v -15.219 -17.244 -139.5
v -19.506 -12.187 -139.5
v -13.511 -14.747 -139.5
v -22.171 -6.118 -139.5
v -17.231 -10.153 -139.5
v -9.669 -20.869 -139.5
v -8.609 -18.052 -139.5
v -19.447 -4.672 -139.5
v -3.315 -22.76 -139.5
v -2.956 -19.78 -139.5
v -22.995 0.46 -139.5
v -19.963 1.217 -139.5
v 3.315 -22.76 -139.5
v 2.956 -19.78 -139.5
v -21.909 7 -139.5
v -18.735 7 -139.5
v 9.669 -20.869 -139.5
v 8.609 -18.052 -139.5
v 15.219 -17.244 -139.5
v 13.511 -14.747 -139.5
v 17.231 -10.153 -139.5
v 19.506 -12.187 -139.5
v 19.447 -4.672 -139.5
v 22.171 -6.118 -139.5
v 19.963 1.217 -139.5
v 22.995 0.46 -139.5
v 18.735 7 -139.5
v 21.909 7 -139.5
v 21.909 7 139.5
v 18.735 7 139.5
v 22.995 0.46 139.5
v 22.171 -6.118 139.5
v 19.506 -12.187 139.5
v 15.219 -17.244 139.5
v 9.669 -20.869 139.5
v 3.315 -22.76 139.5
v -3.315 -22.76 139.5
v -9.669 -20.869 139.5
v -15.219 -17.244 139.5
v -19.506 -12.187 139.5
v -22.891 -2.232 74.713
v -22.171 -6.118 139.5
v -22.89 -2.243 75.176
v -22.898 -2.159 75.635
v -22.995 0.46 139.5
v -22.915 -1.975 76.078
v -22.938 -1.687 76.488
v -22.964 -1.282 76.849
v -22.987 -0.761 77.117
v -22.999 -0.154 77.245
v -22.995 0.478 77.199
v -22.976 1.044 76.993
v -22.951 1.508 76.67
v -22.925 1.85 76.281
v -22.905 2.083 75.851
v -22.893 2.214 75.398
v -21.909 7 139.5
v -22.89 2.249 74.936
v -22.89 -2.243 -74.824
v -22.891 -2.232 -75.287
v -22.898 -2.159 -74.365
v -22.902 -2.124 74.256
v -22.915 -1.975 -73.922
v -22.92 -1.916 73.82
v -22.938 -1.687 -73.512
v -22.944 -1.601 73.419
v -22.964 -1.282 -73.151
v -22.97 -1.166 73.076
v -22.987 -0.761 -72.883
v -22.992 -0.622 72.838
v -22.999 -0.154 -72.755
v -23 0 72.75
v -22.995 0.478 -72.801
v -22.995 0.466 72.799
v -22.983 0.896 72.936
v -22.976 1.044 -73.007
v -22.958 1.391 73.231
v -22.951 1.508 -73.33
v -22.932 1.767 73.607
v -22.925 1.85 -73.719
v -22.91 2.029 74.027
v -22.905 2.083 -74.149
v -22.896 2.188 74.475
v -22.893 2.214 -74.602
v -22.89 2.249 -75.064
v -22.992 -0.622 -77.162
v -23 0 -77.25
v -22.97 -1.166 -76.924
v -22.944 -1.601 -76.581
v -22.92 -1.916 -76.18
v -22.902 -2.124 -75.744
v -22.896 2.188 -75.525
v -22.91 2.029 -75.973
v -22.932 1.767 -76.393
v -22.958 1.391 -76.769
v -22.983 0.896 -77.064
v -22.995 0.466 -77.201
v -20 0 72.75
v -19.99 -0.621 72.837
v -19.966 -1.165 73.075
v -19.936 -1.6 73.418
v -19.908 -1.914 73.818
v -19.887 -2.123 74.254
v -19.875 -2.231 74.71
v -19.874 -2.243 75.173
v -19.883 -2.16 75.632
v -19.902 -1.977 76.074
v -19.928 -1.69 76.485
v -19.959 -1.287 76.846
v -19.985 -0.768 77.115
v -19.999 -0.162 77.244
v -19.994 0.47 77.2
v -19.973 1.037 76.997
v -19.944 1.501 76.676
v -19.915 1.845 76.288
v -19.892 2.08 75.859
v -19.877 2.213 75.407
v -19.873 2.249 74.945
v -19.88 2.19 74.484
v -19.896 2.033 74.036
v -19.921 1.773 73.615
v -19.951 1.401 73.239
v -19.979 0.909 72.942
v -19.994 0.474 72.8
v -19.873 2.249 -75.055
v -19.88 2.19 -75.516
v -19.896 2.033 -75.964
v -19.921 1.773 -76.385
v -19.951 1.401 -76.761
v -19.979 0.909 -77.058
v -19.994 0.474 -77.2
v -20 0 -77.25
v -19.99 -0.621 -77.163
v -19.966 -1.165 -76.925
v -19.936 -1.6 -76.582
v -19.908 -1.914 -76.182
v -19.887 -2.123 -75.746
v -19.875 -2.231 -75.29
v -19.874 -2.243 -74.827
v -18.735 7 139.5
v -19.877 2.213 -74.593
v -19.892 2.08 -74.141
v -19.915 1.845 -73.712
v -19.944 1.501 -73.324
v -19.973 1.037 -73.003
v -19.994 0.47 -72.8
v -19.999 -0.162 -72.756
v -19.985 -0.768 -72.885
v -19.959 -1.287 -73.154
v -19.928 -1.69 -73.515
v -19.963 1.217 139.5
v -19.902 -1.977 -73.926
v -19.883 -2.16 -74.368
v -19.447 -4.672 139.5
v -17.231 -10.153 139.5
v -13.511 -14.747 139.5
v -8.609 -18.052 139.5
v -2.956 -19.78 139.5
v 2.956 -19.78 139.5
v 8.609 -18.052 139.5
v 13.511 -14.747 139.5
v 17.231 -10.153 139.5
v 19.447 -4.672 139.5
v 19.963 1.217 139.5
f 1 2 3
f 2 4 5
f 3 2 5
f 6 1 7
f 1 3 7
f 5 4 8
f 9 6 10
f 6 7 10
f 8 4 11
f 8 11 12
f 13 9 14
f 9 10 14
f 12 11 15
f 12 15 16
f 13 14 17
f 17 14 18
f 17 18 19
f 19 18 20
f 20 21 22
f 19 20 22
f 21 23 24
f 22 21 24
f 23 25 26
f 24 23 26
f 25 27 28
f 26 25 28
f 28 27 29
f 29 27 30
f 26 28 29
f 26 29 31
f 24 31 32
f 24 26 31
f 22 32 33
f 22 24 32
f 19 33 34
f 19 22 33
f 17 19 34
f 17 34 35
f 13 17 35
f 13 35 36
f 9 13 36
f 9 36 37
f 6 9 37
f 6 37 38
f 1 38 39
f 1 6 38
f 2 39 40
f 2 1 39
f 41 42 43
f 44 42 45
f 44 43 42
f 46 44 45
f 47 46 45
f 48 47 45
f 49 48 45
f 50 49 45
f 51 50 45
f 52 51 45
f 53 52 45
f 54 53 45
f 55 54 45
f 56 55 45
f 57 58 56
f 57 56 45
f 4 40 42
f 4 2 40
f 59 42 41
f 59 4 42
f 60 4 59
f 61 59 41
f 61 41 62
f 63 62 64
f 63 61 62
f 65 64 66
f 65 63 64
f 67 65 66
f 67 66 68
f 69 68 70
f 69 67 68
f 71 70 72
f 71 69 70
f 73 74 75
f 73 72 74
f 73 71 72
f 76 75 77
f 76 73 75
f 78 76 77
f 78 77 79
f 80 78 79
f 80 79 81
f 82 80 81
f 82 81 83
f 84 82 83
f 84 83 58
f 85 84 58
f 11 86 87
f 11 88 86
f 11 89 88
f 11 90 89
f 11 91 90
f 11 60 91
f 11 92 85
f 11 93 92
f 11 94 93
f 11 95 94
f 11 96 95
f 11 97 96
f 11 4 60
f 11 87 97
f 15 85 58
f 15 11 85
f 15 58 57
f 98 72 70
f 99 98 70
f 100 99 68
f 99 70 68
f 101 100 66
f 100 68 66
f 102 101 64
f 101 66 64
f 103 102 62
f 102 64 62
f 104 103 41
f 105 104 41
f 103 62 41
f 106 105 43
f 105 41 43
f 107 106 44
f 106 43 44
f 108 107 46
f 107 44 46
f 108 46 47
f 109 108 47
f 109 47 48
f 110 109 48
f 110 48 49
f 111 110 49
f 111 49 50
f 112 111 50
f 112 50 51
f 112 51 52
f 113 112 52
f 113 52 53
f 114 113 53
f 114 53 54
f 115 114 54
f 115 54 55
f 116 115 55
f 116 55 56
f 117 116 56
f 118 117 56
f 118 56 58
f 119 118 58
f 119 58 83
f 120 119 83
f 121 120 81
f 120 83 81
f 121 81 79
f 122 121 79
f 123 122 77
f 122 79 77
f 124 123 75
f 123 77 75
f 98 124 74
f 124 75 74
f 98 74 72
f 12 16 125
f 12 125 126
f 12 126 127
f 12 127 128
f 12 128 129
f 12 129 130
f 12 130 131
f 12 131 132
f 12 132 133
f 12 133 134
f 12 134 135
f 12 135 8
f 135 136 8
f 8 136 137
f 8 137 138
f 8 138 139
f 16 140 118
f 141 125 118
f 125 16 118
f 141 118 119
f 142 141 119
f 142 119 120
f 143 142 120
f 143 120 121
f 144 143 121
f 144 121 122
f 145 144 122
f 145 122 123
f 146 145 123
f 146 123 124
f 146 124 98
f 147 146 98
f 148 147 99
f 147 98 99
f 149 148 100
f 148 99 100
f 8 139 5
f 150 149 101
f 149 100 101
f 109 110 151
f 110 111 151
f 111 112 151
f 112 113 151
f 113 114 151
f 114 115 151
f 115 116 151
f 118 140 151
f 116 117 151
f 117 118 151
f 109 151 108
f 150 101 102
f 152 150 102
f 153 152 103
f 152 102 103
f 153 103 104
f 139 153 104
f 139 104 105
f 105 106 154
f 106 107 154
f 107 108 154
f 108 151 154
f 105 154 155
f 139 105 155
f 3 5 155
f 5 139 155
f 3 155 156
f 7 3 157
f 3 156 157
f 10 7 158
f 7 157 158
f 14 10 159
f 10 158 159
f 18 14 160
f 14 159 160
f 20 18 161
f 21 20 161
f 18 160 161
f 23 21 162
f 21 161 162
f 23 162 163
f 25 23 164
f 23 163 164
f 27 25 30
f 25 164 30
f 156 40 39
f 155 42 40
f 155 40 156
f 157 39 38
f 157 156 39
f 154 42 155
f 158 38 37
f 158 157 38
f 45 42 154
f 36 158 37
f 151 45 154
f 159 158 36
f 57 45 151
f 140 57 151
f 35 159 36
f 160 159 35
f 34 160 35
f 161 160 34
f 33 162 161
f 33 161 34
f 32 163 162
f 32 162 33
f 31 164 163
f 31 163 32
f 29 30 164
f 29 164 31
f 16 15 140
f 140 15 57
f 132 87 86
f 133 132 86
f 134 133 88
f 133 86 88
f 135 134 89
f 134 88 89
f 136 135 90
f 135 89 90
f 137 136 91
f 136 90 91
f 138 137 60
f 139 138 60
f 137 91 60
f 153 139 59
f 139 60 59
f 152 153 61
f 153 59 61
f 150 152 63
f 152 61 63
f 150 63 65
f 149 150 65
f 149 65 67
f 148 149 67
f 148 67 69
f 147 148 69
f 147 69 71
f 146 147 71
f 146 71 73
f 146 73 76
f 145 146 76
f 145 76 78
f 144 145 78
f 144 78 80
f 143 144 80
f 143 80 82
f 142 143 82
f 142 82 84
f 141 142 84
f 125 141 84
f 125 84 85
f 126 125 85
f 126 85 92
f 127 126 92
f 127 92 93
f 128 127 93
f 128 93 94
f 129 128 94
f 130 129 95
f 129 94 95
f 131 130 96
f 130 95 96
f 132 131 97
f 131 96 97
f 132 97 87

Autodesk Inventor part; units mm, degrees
ref_plane "YZ Plane" through (0, 0, 0) normal (1, 0, 0) x (0, 1, 0)
ref_plane "XZ Plane" through (0, 0, 0) normal (0, 1, 0) x (-1, 0, 0)
ref_plane "XY Plane" through (0, 0, 0) normal (0, 0, 1) x (1, 0, 0)
sketch "Sketch1" plane through (0, 0, 0) normal (0, 0, 1) x (1, 0, 0)
  circle A0 centre (0, 0) radius 20
  circle A1 centre (0, 0) radius 23
  dimension "d0" = 40
  dimension "d1" = 46
extrude "Extrusion1" add sketch "Sketch1" along normal mid plane 279
sketch "Sketch2" plane through (0, 0, 0) normal (1, 0, 0) x (0, 1, 0)
  line L0 (0, 105) -> (0, -105) projected
  line L1 (-105, 0) -> (105, 0) projected
  point P0 (0, 0)
  point P1 (0, 75)
  point P2 (0, -75)
  dimension "d19" = 75
  dimension "d20" = 150
hole "Hole1" at (0, 0, 75) at (0, 0, -75) direction (-1, 0, 0) diameter 4.5 end through all clearance for "Flat Head Machine Screw" size "M4" standard "Ansi Metric M Profile"
sketch "Sketch3" plane through (0, 0, 0) normal (1, 0, 0) x (0, 1, 0)
  line L0 (23, -139.5) -> (7, -139.5)
  line L1 (7, -139.5) -> (7, 139.5)
  line L2 (7, 139.5) -> (23, 139.5)
  line L3 (23, 139.5) -> (23, -139.5)
  line L4 (23, 139.5) -> (-23, 139.5) projected
  line L5 (-23, -139.5) -> (23, -139.5) projected
  line L6 (0, 198.1) -> (0, -198.1) projected
  point P0 (0, 0)
  dimension "d13" = 0
  dimension "d14" = 0
  dimension "d15" = 7
extrude "Extrusion2" cut sketch "Sketch3" along normal through all both and the other way through all contours L0 L1 L2 L3
equation "\"d19\" = 0.5 * d20"
properties part number "Top_Tilt Pipe" material "PVC-Piping"
